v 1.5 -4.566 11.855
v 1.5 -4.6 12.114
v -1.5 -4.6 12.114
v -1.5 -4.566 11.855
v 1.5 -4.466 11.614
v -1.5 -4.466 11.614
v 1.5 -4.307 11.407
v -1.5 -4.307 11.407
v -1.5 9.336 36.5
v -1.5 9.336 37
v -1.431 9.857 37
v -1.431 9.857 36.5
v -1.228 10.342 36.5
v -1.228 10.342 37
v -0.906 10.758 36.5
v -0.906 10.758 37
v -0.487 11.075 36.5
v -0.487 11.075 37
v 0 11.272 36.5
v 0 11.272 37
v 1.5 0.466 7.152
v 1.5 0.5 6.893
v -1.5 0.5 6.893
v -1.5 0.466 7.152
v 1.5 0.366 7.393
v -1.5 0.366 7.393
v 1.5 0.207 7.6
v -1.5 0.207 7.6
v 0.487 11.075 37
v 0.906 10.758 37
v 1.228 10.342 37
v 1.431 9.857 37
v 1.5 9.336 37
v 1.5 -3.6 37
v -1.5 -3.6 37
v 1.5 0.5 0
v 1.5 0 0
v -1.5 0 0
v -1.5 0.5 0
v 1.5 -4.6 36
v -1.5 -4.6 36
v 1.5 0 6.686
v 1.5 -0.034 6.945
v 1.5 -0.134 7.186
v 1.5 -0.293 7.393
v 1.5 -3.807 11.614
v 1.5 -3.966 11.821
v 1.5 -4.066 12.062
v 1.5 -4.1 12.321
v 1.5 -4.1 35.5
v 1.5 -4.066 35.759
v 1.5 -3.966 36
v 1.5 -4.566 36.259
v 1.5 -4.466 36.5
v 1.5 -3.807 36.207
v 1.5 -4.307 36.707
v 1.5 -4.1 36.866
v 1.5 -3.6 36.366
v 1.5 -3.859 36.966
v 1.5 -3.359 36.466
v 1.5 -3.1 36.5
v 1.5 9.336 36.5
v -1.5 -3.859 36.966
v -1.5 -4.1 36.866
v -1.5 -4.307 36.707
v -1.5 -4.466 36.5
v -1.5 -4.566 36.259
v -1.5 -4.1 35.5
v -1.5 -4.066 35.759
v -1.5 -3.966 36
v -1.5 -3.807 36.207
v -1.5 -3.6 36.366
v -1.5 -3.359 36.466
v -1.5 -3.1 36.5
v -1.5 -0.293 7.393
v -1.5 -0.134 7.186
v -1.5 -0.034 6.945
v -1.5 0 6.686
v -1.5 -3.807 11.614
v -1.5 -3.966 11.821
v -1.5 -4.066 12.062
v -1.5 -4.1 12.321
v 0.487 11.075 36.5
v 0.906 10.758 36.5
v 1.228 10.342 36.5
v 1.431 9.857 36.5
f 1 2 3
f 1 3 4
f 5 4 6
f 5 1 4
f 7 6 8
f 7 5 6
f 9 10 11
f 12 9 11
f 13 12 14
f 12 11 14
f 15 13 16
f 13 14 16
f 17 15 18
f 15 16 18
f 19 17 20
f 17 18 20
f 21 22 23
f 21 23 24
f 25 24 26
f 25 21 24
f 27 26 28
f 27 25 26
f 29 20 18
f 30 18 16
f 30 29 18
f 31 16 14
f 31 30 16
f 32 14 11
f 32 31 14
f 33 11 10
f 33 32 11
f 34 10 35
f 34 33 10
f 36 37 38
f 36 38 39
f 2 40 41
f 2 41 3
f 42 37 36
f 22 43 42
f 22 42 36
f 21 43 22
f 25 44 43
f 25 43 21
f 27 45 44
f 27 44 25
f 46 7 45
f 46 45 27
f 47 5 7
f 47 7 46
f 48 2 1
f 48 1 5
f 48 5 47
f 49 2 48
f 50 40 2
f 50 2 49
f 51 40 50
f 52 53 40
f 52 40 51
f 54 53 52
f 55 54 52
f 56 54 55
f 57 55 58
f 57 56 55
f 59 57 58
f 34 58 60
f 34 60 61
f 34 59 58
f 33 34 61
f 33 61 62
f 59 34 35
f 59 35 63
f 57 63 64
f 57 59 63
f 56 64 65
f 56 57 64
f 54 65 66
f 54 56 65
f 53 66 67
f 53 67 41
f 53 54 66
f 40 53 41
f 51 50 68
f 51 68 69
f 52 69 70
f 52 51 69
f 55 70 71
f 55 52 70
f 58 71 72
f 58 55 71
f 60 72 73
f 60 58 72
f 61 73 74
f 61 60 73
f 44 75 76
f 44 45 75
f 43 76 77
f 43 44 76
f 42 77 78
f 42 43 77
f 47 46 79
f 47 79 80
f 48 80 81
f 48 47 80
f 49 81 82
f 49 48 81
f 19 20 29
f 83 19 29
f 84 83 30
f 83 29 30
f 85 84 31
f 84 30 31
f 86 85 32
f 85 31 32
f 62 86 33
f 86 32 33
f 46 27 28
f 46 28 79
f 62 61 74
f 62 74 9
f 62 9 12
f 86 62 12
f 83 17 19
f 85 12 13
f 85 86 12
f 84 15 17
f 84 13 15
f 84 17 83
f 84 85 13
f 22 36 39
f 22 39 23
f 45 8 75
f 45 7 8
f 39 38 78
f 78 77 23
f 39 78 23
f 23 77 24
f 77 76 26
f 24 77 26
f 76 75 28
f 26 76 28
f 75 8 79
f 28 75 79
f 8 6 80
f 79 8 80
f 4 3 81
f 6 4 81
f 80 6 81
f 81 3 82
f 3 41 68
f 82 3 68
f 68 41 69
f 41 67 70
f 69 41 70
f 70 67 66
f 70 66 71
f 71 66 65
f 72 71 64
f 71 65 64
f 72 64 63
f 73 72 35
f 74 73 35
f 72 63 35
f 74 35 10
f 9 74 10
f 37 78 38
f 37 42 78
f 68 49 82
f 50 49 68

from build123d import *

# Parameters (mm, degrees)
F1_DEPTH = 1.5
F3_DEPTH = 25


with BuildPart() as f1:
    # F0 (on Right) → F1 (new body, symmetric)
    with BuildSketch(Plane.YZ):
        with BuildLine():
            Line((0, 6.685786), (0, 0))
            Line((0, 0), (0.5, 0))
            Line((0.5, 0), (0.5, 6.892786))
            ThreePointArc((0.5, 6.892786), (0.42388, 7.27547), (0.207107, 7.599893))
            Line((0.207107, 7.599893), (-3.807107, 11.614107))
            ThreePointArc((-3.807107, 11.614107), (-4.02388, 11.93853), (-4.1, 12.321214))
            Line((-4.1, 12.321214), (-4.1, 35.5))
            ThreePointArc((-4.1, 35.5), (-3.807107, 36.207107), (-3.1, 36.5))
            Line((-3.1, 36.5), (11.336, 36.5))
            Line((11.336, 36.5), (11.336, 37))
            Line((11.336, 37), (-3.6, 37))
            ThreePointArc((-3.6, 37), (-4.307107, 36.707107), (-4.6, 36))
            Line((-4.6, 36), (-4.6, 12.114214))
            ThreePointArc((-4.6, 12.114214), (-4.52388, 11.73153), (-4.307107, 11.407107))
            Line((-4.307107, 11.407107), (-0.292893, 7.392893))
            ThreePointArc((-0.292893, 7.392893), (-0.07612, 7.06847), (0, 6.685786))
        make_face()
    extrude(amount=F1_DEPTH, both=True)

    # F2 (on face) → F3 (cut)
    with BuildSketch(Plane.XY.offset(37)):
        with BuildLine():
            ThreePointArc((-1.5, 9.336), (-1.081139, 10.560745), (0, 11.272492))
            ThreePointArc((0, 11.272492), (1.081139, 10.560745), (1.5, 9.336))
            Line((1.5, 9.336), (1.5, 11.336))
            Line((1.5, 11.336), (-1.5, 11.336))
            Line((-1.5, 11.336), (-1.5, 9.336))
        make_face()
    extrude(amount=-F3_DEPTH, mode=Mode.SUBTRACT)


solid = f1.part
